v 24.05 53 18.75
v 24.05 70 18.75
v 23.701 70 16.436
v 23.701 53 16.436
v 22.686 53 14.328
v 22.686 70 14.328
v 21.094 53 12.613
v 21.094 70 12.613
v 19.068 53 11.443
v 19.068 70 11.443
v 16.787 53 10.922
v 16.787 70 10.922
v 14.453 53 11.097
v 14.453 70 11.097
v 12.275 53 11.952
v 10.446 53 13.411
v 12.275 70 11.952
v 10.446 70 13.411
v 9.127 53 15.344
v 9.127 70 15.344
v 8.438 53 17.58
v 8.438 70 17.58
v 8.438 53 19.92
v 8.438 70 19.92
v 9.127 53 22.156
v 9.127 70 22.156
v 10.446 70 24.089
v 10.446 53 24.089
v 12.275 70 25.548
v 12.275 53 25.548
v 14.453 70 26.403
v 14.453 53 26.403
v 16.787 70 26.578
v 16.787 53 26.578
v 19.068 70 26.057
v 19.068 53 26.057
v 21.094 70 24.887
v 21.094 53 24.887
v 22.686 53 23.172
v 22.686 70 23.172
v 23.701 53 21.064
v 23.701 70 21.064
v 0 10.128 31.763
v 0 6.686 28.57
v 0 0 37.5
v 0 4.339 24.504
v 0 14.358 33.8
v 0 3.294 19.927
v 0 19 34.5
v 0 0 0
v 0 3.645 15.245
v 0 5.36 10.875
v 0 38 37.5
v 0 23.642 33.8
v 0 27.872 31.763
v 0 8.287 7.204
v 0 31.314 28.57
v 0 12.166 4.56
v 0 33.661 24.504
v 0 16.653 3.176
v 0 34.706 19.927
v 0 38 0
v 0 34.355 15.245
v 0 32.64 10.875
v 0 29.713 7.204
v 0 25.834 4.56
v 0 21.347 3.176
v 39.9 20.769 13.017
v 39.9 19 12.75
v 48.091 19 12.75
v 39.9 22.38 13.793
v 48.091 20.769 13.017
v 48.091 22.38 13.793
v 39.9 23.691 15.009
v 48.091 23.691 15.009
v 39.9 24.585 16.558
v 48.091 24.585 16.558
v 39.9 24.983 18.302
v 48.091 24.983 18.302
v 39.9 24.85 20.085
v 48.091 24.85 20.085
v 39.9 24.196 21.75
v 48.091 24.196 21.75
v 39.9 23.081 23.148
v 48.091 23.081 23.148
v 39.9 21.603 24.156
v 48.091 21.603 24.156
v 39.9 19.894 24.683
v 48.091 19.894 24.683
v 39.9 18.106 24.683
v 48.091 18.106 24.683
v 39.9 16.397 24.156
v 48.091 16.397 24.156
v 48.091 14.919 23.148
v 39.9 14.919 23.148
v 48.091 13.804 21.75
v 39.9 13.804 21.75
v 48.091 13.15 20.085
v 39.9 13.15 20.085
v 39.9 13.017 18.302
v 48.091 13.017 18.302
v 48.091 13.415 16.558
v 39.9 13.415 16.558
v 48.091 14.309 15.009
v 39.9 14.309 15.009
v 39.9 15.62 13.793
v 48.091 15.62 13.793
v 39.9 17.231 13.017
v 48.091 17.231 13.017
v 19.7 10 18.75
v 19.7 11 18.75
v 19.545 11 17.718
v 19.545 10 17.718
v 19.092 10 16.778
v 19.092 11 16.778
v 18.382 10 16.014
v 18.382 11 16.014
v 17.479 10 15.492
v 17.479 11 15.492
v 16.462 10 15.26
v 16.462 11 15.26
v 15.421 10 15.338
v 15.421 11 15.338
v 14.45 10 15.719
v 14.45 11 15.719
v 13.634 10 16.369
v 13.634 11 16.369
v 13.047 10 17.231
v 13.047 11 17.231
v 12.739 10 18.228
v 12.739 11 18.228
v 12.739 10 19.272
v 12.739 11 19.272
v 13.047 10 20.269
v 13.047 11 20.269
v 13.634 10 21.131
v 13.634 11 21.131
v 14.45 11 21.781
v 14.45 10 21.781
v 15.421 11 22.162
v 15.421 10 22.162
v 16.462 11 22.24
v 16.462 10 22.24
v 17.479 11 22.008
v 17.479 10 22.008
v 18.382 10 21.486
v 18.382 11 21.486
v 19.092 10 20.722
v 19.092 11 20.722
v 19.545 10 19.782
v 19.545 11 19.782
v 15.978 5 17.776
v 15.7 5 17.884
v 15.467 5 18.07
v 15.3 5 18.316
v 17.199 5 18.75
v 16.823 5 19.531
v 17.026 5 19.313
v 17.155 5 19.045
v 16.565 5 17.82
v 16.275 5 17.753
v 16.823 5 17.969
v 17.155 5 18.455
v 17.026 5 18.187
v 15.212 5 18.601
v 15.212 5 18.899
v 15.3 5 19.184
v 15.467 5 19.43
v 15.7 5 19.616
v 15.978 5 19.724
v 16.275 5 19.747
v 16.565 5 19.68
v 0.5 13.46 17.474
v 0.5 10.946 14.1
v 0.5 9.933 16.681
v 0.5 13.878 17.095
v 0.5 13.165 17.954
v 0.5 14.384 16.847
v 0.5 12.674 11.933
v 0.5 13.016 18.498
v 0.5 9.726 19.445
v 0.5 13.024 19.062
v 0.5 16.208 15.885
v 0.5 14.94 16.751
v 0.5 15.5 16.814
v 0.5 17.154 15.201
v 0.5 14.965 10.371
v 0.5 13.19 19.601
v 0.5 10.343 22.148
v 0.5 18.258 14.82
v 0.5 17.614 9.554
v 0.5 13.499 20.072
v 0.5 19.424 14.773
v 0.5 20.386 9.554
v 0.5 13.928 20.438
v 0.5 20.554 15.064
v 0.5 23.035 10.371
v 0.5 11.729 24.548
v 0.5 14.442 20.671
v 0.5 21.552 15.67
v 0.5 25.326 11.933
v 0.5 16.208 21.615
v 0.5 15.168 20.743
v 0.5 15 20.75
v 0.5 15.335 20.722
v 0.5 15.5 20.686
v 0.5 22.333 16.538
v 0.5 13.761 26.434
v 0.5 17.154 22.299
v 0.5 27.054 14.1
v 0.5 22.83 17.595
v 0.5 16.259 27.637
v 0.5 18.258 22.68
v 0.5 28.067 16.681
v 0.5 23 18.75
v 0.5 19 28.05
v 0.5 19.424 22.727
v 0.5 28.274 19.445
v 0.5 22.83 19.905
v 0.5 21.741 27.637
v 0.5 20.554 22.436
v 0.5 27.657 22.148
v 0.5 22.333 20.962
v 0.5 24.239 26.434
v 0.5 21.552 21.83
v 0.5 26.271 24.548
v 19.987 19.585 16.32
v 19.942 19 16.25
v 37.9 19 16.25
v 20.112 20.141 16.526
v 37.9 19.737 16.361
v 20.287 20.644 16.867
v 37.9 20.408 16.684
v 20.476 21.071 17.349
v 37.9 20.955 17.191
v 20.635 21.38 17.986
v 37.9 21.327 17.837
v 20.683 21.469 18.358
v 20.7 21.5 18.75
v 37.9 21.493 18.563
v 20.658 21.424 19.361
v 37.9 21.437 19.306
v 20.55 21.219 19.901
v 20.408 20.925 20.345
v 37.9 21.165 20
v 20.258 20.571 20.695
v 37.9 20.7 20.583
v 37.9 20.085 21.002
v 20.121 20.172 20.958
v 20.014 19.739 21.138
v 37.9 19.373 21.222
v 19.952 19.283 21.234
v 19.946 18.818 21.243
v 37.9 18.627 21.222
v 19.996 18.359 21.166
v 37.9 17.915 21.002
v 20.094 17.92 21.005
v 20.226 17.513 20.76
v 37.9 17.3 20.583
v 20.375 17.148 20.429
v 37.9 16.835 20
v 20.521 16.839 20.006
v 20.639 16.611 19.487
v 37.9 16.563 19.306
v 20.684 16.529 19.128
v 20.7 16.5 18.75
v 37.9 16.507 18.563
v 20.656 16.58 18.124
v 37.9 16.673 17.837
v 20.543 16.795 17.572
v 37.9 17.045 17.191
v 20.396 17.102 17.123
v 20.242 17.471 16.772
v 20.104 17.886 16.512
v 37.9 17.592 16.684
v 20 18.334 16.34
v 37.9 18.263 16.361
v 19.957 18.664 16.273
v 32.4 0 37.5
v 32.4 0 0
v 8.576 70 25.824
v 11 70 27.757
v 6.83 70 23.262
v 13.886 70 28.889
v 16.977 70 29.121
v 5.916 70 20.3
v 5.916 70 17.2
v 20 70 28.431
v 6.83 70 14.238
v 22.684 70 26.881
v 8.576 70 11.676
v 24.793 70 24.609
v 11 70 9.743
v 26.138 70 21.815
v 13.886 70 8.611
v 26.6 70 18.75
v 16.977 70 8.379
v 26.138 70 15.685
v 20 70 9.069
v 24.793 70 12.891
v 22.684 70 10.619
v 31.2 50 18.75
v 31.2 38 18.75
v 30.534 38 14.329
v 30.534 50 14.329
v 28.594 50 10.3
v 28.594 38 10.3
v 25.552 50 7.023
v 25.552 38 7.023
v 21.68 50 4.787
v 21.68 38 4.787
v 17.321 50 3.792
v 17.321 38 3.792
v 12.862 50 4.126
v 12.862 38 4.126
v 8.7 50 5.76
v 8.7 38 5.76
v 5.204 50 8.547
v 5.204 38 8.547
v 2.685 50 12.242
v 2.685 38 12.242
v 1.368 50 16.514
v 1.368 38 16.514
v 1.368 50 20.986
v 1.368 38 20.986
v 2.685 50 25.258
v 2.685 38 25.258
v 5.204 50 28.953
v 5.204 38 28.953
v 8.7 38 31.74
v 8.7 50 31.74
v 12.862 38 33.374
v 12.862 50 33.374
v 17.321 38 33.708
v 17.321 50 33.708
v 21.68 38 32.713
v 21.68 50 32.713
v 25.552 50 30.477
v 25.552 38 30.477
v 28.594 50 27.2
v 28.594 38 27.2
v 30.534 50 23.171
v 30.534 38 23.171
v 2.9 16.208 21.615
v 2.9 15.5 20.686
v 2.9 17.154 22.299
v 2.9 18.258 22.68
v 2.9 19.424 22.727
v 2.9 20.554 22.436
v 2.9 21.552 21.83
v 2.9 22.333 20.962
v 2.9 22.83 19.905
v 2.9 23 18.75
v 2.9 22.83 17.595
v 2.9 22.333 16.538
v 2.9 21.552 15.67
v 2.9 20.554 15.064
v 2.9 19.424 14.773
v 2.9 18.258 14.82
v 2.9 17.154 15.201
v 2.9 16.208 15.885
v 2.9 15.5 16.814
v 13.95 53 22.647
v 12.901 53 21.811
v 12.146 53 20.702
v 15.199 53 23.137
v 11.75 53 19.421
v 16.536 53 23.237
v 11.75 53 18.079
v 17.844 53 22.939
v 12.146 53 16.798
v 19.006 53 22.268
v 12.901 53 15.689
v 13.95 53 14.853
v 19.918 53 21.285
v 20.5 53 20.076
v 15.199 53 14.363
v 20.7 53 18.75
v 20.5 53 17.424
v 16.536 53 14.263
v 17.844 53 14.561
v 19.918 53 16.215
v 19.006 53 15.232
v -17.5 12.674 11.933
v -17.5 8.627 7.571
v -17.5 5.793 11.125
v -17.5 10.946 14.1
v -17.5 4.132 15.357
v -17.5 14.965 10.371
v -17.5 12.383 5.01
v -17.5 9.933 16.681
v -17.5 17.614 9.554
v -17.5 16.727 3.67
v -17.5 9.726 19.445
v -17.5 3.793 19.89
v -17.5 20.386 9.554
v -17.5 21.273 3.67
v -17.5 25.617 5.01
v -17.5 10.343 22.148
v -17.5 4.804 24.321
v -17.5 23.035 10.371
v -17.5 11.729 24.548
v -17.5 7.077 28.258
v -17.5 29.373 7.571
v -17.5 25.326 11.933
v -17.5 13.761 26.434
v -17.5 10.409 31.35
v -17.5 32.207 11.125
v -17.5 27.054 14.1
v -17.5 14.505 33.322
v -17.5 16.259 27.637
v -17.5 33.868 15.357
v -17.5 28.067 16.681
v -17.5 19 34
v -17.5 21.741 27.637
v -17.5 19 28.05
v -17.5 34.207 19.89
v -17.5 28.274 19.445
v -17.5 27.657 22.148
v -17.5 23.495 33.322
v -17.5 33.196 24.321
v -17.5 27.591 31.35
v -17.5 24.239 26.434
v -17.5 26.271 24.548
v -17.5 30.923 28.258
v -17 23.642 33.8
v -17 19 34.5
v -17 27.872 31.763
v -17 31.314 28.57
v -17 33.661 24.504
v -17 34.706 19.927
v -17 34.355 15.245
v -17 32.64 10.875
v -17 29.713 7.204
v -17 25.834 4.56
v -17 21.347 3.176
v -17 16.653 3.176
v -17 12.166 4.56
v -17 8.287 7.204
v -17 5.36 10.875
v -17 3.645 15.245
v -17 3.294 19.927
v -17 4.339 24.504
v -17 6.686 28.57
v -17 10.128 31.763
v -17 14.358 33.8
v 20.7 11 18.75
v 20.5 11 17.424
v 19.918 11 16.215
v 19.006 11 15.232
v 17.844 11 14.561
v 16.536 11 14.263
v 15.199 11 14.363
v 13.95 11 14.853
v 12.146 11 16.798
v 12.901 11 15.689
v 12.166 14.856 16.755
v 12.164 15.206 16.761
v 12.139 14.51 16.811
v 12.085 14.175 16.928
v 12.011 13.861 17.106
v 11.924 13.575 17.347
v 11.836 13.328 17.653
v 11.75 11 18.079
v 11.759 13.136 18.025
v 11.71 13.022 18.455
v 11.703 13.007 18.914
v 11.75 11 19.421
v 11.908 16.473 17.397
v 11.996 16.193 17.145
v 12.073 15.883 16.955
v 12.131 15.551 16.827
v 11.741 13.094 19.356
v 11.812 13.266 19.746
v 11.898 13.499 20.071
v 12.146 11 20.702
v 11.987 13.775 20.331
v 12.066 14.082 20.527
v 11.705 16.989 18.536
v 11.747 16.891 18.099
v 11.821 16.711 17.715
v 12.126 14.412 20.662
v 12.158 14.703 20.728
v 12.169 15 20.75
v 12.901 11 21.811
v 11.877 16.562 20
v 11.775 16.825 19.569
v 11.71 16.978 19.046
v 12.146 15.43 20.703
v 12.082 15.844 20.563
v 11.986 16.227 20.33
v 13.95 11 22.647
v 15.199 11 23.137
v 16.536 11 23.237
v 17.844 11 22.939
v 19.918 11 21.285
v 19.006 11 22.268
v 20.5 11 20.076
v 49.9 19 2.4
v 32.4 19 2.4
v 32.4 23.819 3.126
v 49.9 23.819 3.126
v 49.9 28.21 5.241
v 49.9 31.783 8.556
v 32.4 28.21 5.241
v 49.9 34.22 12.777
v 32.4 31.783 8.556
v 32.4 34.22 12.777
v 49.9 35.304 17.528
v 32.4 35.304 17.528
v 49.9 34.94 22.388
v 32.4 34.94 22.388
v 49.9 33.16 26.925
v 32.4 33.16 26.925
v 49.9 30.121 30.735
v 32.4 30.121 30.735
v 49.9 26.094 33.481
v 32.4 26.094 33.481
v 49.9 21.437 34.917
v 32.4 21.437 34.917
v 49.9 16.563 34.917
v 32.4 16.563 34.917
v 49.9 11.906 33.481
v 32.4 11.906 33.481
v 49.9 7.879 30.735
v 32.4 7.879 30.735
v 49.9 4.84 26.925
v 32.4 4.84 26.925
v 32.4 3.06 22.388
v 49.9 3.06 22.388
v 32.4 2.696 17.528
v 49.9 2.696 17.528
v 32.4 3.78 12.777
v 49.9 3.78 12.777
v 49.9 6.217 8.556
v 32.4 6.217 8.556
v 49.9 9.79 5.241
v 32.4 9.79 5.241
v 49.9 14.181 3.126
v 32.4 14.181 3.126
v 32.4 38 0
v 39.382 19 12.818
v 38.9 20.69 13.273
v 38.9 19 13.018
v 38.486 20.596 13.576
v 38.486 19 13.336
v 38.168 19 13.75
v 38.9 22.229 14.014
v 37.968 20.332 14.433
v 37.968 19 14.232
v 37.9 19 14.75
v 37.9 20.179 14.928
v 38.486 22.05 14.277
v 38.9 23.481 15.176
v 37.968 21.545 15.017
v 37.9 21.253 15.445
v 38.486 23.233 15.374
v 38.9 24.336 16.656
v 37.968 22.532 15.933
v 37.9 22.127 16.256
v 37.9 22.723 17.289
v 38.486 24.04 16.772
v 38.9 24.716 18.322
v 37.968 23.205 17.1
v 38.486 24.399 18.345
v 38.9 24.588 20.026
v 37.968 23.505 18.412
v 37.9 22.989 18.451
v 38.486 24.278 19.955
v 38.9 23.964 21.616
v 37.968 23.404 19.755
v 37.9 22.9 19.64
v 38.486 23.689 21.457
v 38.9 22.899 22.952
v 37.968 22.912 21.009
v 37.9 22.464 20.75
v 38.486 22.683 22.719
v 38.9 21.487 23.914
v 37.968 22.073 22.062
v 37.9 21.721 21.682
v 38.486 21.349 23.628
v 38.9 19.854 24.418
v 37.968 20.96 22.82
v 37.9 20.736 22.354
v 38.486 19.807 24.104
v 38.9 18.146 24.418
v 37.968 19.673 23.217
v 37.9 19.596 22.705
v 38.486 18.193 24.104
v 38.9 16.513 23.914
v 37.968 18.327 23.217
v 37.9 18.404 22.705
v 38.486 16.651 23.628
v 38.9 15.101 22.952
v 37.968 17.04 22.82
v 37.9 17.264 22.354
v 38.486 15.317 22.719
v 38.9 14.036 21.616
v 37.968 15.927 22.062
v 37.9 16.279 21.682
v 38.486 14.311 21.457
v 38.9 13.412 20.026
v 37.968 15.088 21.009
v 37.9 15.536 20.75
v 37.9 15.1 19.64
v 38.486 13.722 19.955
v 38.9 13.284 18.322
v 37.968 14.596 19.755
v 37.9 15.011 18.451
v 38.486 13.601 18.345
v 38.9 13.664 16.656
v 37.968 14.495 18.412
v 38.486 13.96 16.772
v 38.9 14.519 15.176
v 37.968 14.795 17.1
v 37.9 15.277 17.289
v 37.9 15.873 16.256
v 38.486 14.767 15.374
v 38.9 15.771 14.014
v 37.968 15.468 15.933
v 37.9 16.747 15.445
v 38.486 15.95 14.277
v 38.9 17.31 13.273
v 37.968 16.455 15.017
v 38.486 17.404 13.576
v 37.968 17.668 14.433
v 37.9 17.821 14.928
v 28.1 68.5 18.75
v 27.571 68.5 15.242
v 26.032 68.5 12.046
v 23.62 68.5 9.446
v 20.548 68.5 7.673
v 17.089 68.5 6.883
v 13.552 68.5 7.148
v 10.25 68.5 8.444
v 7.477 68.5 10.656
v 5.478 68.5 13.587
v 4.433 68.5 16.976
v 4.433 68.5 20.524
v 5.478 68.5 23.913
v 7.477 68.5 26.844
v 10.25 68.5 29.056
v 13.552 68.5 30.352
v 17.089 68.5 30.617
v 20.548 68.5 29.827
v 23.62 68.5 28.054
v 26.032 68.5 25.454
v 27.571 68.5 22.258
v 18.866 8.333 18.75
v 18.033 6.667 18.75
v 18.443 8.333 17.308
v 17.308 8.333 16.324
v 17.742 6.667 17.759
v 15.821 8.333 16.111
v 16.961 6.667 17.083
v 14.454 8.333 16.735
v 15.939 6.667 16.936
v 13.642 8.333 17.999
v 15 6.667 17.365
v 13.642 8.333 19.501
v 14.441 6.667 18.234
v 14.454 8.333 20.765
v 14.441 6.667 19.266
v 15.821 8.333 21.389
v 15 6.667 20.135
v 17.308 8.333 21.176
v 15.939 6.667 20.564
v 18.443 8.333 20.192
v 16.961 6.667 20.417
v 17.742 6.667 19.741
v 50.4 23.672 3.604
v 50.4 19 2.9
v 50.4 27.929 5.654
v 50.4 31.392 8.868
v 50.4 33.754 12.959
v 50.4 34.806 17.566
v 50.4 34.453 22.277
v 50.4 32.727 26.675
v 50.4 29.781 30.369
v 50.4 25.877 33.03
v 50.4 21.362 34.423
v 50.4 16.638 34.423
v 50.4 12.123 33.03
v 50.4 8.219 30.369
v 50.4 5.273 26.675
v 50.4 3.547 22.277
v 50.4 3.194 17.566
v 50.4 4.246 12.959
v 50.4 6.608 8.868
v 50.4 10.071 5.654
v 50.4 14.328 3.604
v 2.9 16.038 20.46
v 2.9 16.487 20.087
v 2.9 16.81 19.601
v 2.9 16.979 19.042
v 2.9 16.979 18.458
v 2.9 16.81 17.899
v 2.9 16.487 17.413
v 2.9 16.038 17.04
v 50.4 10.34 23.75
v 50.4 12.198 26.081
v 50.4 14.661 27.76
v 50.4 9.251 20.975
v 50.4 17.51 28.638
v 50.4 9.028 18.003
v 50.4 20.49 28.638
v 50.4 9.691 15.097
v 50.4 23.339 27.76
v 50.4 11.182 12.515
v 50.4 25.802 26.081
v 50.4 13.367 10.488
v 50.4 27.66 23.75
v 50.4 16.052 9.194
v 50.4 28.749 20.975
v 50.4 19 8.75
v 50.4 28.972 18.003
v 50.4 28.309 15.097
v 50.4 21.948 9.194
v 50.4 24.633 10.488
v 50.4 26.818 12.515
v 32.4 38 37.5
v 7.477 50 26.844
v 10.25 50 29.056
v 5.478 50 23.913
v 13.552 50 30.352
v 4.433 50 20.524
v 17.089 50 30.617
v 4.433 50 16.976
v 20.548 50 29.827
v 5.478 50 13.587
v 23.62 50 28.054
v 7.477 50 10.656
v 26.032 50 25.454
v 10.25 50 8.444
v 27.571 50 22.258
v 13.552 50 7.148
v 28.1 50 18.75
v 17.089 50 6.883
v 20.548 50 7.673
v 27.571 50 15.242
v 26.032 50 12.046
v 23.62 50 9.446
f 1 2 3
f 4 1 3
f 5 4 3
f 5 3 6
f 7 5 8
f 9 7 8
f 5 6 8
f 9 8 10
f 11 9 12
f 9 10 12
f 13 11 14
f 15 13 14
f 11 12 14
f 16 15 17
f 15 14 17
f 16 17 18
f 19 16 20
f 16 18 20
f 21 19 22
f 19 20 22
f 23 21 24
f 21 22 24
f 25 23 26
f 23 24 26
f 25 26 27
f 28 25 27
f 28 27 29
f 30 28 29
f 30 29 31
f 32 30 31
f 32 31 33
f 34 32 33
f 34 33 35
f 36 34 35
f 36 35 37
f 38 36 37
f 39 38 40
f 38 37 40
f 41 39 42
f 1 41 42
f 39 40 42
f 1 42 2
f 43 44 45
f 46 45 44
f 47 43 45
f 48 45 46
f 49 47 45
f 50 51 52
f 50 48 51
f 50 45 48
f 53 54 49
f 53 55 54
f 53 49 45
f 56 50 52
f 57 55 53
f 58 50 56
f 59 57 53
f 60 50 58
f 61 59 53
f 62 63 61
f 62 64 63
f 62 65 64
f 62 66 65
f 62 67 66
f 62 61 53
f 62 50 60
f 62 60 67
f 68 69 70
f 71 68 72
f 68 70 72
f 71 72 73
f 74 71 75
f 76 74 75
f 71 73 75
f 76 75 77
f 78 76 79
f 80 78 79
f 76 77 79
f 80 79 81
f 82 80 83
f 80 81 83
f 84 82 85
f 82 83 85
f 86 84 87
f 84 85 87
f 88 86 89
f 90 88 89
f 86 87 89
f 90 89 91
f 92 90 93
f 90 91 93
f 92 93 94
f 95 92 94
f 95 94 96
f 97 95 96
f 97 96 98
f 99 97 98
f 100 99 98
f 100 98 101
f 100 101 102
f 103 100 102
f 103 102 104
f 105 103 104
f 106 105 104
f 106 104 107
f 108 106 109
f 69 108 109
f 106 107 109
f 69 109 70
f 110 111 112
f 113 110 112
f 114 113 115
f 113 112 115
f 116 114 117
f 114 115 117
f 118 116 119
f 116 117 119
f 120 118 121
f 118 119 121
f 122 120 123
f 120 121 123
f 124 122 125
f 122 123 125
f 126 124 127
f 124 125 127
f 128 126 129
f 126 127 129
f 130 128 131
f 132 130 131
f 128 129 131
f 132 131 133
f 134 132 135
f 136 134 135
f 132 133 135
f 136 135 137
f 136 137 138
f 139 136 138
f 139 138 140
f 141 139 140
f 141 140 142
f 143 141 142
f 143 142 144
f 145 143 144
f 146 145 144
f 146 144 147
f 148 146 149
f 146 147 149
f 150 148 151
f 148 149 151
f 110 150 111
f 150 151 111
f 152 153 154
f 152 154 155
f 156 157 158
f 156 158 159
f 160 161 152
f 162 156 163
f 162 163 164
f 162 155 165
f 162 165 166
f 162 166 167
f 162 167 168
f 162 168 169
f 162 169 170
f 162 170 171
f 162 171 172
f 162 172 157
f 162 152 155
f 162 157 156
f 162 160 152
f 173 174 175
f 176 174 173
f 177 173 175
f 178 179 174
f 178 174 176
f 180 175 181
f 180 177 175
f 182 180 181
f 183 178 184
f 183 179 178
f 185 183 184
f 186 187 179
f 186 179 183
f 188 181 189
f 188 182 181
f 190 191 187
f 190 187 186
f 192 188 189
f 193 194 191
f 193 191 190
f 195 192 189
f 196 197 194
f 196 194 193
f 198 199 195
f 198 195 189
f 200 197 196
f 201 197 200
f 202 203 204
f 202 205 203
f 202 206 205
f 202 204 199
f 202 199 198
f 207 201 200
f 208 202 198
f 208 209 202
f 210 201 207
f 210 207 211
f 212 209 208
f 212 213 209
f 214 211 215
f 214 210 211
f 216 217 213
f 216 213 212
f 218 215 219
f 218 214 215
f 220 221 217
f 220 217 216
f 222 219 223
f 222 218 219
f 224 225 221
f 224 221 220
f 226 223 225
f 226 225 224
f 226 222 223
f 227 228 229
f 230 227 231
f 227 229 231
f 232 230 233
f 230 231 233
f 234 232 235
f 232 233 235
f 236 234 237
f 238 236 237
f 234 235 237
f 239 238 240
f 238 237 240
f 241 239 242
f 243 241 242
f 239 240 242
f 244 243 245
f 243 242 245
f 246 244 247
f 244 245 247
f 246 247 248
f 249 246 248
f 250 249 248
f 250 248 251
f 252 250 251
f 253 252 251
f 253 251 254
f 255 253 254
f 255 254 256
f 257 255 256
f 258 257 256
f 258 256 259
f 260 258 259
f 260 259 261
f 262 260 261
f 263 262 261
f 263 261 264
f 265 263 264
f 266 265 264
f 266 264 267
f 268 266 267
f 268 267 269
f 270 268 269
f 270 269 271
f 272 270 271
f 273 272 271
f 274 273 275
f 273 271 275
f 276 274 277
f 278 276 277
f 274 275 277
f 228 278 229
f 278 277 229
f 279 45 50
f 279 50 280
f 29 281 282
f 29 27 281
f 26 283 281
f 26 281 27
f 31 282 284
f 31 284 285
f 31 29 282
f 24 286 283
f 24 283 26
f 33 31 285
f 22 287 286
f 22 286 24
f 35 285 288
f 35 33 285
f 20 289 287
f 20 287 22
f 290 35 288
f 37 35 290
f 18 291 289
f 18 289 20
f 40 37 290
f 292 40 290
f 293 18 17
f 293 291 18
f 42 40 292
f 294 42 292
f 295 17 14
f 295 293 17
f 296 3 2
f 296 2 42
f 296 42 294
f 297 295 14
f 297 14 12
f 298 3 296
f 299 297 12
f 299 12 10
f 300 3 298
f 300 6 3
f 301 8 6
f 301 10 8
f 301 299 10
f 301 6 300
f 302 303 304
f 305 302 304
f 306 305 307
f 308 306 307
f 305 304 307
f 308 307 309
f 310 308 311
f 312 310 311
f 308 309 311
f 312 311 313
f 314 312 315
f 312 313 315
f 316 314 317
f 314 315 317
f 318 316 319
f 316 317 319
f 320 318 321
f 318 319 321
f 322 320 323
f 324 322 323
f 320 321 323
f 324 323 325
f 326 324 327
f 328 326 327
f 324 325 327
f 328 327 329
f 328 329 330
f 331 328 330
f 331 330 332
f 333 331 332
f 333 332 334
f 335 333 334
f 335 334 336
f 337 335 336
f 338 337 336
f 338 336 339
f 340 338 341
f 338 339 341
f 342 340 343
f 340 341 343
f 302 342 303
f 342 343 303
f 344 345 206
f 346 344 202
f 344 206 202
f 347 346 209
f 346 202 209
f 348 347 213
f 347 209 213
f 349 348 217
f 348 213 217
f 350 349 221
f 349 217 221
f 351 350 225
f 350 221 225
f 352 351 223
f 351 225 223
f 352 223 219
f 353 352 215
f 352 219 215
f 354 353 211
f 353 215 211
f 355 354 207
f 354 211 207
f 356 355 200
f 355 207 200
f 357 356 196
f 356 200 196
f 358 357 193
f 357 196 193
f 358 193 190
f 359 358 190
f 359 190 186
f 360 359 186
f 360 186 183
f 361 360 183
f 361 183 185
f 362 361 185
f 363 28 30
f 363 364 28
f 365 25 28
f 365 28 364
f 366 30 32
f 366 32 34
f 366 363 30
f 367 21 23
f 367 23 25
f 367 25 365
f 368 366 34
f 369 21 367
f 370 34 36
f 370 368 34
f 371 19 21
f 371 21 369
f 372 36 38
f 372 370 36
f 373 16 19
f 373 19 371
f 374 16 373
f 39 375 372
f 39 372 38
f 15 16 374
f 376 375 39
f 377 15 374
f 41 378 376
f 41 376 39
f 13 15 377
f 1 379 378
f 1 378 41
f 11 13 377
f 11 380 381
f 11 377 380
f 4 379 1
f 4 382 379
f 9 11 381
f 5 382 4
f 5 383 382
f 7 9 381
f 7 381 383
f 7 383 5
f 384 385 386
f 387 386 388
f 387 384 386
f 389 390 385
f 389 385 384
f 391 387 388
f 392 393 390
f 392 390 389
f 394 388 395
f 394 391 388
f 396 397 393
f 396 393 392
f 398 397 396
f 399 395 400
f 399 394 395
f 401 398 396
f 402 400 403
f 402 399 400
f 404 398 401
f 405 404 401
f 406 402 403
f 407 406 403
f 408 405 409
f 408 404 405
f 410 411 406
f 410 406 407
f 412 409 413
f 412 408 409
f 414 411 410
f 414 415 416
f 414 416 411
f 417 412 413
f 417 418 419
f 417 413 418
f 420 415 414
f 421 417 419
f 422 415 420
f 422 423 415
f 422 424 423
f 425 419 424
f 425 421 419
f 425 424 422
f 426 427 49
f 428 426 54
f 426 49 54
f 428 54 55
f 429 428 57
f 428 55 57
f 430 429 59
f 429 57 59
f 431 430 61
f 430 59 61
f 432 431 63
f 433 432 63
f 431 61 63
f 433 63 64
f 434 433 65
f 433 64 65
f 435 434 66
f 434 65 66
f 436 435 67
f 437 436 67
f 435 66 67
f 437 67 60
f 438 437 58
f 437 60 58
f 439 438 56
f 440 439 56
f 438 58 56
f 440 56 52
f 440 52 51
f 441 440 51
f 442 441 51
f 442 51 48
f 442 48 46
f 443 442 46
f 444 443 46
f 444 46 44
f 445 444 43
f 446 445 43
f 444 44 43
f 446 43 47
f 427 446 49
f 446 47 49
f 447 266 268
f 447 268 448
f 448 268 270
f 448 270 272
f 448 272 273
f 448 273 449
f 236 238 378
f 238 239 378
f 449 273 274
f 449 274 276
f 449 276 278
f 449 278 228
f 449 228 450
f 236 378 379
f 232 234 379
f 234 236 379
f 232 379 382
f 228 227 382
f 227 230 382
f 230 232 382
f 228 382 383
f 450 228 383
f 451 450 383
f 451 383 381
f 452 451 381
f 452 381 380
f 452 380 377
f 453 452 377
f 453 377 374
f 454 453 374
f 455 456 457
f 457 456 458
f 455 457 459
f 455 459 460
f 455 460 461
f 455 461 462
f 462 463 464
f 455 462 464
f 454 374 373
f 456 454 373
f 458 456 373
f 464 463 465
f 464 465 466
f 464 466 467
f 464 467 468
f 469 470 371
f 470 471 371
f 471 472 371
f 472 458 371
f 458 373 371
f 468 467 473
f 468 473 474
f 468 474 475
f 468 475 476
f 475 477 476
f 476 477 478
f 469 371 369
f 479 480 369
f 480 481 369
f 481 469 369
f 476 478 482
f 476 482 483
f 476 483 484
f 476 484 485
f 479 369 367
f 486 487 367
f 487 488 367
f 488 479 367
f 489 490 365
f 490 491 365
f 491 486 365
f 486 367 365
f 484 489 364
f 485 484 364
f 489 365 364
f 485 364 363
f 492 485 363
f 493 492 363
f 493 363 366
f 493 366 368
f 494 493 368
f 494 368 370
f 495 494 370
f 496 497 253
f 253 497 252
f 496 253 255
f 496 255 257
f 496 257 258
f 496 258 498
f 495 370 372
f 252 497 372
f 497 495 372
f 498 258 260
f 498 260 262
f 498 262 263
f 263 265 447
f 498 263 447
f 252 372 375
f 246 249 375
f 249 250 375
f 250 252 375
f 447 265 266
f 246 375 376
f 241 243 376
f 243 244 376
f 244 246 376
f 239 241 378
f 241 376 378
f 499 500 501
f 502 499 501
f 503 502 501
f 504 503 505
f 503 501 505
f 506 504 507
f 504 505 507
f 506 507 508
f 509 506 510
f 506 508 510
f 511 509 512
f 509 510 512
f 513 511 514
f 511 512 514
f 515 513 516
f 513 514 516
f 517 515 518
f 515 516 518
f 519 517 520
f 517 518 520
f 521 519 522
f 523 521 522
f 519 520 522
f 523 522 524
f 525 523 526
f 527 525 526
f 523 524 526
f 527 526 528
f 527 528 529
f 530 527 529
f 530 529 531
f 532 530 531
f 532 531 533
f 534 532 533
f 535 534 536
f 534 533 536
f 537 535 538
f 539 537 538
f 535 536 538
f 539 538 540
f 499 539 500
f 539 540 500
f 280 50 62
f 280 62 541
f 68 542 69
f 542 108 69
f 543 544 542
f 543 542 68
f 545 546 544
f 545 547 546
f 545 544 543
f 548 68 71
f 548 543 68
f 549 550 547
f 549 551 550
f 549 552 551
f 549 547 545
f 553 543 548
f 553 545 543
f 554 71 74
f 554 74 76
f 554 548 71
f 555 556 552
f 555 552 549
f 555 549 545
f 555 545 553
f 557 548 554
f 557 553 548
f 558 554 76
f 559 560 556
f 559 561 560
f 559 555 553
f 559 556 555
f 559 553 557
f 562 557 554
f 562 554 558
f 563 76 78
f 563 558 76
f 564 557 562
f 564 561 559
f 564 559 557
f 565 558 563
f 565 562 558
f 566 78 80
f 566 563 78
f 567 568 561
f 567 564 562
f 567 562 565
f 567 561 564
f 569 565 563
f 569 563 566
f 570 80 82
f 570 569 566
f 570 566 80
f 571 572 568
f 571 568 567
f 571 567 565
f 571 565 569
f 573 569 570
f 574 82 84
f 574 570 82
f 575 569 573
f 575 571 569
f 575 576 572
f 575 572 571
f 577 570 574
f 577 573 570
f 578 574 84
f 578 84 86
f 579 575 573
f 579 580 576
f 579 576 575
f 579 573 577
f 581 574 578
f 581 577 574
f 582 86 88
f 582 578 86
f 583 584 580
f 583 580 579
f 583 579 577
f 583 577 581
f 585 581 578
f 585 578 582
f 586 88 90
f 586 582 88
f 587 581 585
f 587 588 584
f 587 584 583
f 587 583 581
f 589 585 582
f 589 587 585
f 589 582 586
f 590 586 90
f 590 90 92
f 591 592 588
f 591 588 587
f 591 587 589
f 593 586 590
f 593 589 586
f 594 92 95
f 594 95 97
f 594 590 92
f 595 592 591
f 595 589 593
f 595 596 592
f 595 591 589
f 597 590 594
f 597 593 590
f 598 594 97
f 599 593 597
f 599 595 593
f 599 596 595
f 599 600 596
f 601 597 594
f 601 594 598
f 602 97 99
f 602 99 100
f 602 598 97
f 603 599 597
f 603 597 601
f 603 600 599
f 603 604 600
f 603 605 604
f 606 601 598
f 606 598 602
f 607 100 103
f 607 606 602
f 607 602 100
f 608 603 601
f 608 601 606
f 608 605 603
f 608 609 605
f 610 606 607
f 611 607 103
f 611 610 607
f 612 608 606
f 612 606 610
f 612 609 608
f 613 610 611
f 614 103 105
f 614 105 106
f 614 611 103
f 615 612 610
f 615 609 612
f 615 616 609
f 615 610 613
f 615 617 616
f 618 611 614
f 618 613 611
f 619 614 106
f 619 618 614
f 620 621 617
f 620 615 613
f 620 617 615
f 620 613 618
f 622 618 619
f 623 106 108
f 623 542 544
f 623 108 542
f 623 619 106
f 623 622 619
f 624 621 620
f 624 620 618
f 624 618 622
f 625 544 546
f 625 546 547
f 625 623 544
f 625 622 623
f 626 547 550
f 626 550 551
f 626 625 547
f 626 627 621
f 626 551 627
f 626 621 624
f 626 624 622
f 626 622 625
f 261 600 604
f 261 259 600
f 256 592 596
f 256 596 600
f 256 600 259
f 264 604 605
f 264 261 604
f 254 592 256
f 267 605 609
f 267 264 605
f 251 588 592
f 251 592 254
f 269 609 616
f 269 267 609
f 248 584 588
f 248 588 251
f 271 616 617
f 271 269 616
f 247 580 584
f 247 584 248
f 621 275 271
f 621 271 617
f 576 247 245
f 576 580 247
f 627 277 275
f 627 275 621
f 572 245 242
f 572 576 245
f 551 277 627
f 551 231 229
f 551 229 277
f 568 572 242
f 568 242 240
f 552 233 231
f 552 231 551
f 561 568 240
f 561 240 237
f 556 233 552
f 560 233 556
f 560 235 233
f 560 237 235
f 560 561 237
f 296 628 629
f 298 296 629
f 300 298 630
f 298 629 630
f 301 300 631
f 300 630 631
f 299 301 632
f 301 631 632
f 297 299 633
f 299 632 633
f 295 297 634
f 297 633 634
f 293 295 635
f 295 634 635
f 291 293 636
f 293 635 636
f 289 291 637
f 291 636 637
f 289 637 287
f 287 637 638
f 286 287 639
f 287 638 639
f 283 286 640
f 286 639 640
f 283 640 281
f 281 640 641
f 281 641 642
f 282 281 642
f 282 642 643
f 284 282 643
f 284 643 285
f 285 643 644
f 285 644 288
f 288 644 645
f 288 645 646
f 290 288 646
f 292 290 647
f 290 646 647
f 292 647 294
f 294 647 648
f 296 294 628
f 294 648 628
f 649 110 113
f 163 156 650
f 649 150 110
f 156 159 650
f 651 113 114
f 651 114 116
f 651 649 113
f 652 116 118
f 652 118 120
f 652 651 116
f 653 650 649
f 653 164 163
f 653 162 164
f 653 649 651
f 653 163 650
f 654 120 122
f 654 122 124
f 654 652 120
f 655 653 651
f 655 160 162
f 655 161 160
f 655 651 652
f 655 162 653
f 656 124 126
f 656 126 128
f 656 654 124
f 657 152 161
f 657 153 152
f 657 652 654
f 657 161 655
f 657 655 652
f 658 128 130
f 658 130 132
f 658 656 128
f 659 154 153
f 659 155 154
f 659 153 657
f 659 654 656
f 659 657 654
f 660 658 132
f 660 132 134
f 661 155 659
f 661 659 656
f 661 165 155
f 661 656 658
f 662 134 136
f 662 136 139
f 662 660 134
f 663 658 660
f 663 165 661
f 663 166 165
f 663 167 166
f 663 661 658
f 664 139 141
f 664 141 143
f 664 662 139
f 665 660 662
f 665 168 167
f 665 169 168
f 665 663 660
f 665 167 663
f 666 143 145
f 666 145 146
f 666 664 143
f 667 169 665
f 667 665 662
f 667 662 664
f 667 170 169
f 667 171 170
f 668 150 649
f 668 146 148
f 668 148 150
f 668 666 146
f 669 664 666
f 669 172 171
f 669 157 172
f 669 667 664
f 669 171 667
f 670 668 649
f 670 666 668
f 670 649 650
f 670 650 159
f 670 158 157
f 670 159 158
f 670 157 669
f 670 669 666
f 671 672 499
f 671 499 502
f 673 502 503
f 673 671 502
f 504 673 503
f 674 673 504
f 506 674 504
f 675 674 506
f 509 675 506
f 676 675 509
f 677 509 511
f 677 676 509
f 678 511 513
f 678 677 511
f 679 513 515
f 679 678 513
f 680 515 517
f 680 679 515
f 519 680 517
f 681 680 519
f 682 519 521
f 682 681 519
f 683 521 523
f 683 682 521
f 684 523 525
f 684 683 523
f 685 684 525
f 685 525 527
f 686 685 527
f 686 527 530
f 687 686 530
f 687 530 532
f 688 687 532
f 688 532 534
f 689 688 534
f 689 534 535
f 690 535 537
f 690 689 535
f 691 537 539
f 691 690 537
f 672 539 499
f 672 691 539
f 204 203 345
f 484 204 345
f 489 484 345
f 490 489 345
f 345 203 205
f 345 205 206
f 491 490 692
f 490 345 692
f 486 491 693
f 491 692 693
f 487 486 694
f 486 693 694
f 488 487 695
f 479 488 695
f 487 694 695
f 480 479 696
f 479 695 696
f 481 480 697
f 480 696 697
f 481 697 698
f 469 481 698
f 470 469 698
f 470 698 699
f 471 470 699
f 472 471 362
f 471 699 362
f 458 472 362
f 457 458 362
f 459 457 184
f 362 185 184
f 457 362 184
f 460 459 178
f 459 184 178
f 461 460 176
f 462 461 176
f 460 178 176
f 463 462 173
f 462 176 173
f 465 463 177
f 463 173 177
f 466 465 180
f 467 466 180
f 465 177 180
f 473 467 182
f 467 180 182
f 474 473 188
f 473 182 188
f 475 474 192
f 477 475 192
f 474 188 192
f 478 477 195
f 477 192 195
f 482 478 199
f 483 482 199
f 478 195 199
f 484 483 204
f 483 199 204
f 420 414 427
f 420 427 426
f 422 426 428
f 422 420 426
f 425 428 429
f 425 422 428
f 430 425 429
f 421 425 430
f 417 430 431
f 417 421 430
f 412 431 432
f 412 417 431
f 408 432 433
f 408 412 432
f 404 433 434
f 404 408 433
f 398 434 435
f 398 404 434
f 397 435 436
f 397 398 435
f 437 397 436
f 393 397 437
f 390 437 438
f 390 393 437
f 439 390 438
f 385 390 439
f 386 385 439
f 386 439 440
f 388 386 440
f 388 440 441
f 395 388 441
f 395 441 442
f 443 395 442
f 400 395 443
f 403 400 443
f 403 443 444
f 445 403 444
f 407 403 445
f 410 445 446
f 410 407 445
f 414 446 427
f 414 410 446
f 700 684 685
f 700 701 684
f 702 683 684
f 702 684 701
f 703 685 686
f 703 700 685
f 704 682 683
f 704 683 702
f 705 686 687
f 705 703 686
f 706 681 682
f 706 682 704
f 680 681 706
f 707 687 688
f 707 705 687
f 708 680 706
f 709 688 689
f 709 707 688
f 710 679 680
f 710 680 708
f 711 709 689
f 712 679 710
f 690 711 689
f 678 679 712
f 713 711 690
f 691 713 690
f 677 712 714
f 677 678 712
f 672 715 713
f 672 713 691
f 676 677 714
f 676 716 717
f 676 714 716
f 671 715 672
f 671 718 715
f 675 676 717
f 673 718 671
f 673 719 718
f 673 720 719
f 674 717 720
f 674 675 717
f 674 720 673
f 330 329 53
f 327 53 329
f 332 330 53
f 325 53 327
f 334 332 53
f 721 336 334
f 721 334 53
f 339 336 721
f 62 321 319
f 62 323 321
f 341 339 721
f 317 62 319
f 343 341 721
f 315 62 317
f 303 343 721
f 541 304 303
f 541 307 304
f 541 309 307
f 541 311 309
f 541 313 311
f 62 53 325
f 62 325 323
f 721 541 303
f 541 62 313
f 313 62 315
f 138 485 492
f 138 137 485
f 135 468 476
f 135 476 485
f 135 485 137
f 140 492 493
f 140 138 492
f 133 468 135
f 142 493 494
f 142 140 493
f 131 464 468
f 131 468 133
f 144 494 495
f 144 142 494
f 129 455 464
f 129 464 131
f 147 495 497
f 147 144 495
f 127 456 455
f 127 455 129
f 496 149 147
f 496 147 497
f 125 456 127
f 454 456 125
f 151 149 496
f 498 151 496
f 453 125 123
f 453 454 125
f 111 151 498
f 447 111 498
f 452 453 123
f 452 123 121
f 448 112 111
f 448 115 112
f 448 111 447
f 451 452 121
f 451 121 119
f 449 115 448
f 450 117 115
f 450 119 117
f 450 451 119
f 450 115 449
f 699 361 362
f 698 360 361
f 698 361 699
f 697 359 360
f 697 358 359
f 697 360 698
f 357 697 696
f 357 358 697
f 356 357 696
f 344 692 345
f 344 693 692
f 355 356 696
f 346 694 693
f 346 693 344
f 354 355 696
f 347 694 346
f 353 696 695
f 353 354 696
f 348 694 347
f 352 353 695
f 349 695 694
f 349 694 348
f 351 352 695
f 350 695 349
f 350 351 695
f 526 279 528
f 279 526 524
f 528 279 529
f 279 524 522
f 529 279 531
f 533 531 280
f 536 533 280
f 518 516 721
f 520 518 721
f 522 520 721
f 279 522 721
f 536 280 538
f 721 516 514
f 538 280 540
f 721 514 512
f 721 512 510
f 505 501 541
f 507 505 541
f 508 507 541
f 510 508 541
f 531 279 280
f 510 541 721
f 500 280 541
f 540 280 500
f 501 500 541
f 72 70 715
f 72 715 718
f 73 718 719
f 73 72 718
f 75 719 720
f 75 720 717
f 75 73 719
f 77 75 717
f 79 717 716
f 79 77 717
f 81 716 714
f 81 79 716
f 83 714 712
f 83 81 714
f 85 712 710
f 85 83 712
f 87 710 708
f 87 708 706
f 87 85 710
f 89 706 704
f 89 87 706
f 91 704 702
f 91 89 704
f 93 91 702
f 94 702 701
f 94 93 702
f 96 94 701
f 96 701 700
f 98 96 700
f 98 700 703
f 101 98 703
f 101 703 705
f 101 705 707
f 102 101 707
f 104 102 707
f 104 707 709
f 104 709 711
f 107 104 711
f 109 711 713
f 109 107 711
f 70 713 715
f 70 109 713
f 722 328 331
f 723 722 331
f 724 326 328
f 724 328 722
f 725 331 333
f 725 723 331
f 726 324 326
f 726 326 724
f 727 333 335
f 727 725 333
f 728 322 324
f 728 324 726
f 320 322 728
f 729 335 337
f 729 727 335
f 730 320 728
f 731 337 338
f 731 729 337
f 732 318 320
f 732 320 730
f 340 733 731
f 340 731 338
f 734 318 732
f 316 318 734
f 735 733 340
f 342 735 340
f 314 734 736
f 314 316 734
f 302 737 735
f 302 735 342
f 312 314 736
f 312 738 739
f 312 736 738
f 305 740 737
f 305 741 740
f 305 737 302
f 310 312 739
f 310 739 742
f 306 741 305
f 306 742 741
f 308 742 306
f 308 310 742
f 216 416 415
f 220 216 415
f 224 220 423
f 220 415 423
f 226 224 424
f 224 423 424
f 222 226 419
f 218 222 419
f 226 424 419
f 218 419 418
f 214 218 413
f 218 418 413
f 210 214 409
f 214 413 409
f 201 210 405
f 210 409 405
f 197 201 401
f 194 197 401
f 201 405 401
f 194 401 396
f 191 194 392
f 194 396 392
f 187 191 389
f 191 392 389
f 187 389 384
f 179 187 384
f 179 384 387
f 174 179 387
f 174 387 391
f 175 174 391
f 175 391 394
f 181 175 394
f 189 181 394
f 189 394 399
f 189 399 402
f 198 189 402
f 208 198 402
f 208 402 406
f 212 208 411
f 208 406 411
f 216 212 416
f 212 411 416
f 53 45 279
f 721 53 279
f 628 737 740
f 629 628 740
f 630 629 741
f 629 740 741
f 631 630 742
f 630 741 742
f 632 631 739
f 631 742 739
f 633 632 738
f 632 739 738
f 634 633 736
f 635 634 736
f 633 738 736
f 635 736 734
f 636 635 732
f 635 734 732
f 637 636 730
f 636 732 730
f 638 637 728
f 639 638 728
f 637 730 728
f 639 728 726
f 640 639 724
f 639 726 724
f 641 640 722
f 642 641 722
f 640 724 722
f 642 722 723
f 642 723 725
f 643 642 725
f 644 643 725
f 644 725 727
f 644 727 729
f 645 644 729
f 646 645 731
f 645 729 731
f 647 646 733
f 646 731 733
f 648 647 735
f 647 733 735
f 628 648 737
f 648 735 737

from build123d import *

# Parameters (mm, degrees)
SKETCH_1_W          = 32.4
SKETCH_1_H          = 38
EXTRUDE_1_DEPTH     = 37.5
SKETCH_4_R          = 15.75
EXTRUDE_2_DEPTH     = 17.5
SKETCH_5_R          = 9.3
CUT_EXTRUDE_1_DEPTH = 18
SKETCH_6_R          = 4
CUT_EXTRUDE_2_DEPTH = 2.4
SKETCH_7_R          = 2
CUT_EXTRUDE_3_DEPTH = 18.6
SKETCH_8_R          = 16.35
EXTRUDE_3_DEPTH     = 18
SKETCH_9_R          = 6
CUT_EXTRUDE_4_DEPTH = 12.5
CHAMFER_1_SIZE      = 4
CHAMFER_1_SIZE2     = 2.309401077
SKETCH_10_R         = 2.5
CUT_EXTRUDE_5_DEPTH = 21.7
FILLET_1_R          = 2
SKETCH_11_R         = 15
EXTRUDE_4_DEPTH     = 12
SKETCH_12_R         = 11.9
EXTRUDE_5_DEPTH     = 20
SKETCH_13_R         = 7.85
CUT_EXTRUDE_6_DEPTH = 17
SKETCH_14_R         = 4.5
CUT_EXTRUDE_7_DEPTH = 42
CHAMFER_2_SIZE      = 1.5
CHAMFER_4_SIZE      = 0.5
CHAMFER_5_SIZE      = 0.5
SKETCH_15_R         = 3.5
CUT_EXTRUDE_8_DEPTH = 6
CHAMFER_6_SIZE      = 5
CHAMFER_6_SIZE2     = 2.500539856


with BuildPart() as part:
    # Эскиз1 → Бобышка-Вытянуть1 (new body)
    with BuildSketch(Plane.XY):
        with Locations((16.2, 19)):
            Rectangle(SKETCH_1_W, SKETCH_1_H)
    extrude(amount=EXTRUDE_1_DEPTH)

    # Эскиз4 → Бобышка-Вытянуть2 (add)
    with BuildSketch(Plane.ZY):
        with Locations((18.75, 19)):
            Circle(SKETCH_4_R)
    extrude(amount=EXTRUDE_2_DEPTH)

    # Эскиз5 → Вырез-Вытянуть1 (cut)
    with BuildSketch(Plane.ZY.offset(17.5)):
        with Locations((18.75, 19)):
            Circle(SKETCH_5_R)
    extrude(amount=-CUT_EXTRUDE_1_DEPTH, mode=Mode.SUBTRACT)

    # Эскиз6 → Вырез-Вытянуть2 (cut)
    with BuildSketch(Plane.ZY.offset(-0.5)):
        with Locations((18.75, 19)):
            Circle(SKETCH_6_R)
    extrude(amount=-CUT_EXTRUDE_2_DEPTH, mode=Mode.SUBTRACT)

    # Эскиз7 → Вырез-Вытянуть3 (cut)
    with BuildSketch(Plane.ZY.offset(-0.5)):
        with Locations((18.75, 15)):
            Circle(SKETCH_7_R)
    extrude(amount=-CUT_EXTRUDE_3_DEPTH, mode=Mode.SUBTRACT)

    # Эскиз8 → Бобышка-Вытянуть3 (add)
    with BuildSketch(Plane(origin=(32.4, 0, 0), x_dir=(0, 0, -1), z_dir=(1, 0, 0))):
        with Locations((-18.75, 19)):
            Circle(SKETCH_8_R)
    extrude(amount=EXTRUDE_3_DEPTH)

    # Эскиз9 → Вырез-Вытянуть4 (cut)
    with BuildSketch(Plane(origin=(50.4, 0, 0), x_dir=(0, 0, -1), z_dir=(1, 0, 0))):
        with Locations((-18.75, 19)):
            Circle(SKETCH_9_R)
    extrude(amount=-CUT_EXTRUDE_4_DEPTH, mode=Mode.SUBTRACT)

    # Фаска1
    chamfer_1_edges = [part.edges().sort_by_distance(p)[0] for p in [
        (50.4, 19, 24.75),
    ]]
    chamfer_1_side = [part.faces().sort_by_distance(p)[0] for p in [
        (50.4, 19, 34.637552165),
    ]]
    chamfer(chamfer_1_edges, length=CHAMFER_1_SIZE, length2=CHAMFER_1_SIZE2, reference=chamfer_1_side[0])

    # Эскиз10 → Вырез-Вытянуть5 (cut)
    with BuildSketch(Plane(origin=(37.9, 0, 0), x_dir=(0, 0, -1), z_dir=(1, 0, 0))):
        with Locations((-18.75, 19)):
            Circle(SKETCH_10_R)
    extrude(amount=-CUT_EXTRUDE_5_DEPTH, mode=Mode.SUBTRACT)

    # Скругление1
    fillet_1_edges = [part.edges().sort_by_distance(p)[0] for p in [
        (37.9, 19, 24.75),
    ]]
    fillet(fillet_1_edges, radius=FILLET_1_R)

    # Эскиз11 → Бобышка-Вытянуть4 (add)
    with BuildSketch(Plane(origin=(0, 38, 0), x_dir=(1, 0, 0), z_dir=(0, 1, 0))):
        with Locations((16.2, -18.75)):
            Circle(SKETCH_11_R)
    extrude(amount=EXTRUDE_4_DEPTH)

    # Эскиз12 → Бобышка-Вытянуть5 (add)
    with BuildSketch(Plane(origin=(0, 50, 0), x_dir=(1, 0, 0), z_dir=(0, 1, 0))):
        with Locations((16.2, -18.75)):
            Circle(SKETCH_12_R)
    extrude(amount=EXTRUDE_5_DEPTH)

    # Эскиз13 → Вырез-Вытянуть6 (cut)
    with BuildSketch(Plane(origin=(0, 70, 0), x_dir=(1, 0, 0), z_dir=(0, 1, 0))):
        with Locations((16.2, -18.75)):
            Circle(SKETCH_13_R)
    extrude(amount=-CUT_EXTRUDE_6_DEPTH, mode=Mode.SUBTRACT)

    # Эскиз14 → Вырез-Вытянуть7 (cut)
    with BuildSketch(Plane(origin=(0, 53, 0), x_dir=(1, 0, 0), z_dir=(0, 1, 0))):
        with Locations((16.2, -18.75)):
            Circle(SKETCH_14_R)
    extrude(amount=-CUT_EXTRUDE_7_DEPTH, mode=Mode.SUBTRACT)

    # Фаска2
    chamfer_2_edges = [part.edges().sort_by_distance(p)[0] for p in [
        (4.3, 70, 18.75),
    ]]
    chamfer(chamfer_2_edges, length=CHAMFER_2_SIZE)

    # Фаска4
    chamfer_4_edges = [part.edges().sort_by_distance(p)[0] for p in [
        (-17.5, 19, 3),
    ]]
    chamfer(chamfer_4_edges, length=CHAMFER_4_SIZE)

    # Фаска5
    chamfer_5_edges = [part.edges().sort_by_distance(p)[0] for p in [
        (50.4, 19, 35.1),
    ]]
    chamfer(chamfer_5_edges, length=CHAMFER_5_SIZE)

    # Эскиз15 → Вырез-Вытянуть8 (cut)
    with BuildSketch(Plane(origin=(0, 11, 0), x_dir=(1, 0, 0), z_dir=(0, 1, 0))):
        with Locations((16.2, -18.75)):
            Circle(SKETCH_15_R)
    extrude(amount=-CUT_EXTRUDE_8_DEPTH, mode=Mode.SUBTRACT)

    # Фаска6
    chamfer_6_edges = [part.edges().sort_by_distance(p)[0] for p in [
        (12.7, 5, 18.75),
    ]]
    chamfer_6_side = [part.faces().sort_by_distance(p)[0] for p in [
        (12.7, 8, 18.75),
    ]]
    chamfer(chamfer_6_edges, length=CHAMFER_6_SIZE, length2=CHAMFER_6_SIZE2, reference=chamfer_6_side[0])


solid = part.part
